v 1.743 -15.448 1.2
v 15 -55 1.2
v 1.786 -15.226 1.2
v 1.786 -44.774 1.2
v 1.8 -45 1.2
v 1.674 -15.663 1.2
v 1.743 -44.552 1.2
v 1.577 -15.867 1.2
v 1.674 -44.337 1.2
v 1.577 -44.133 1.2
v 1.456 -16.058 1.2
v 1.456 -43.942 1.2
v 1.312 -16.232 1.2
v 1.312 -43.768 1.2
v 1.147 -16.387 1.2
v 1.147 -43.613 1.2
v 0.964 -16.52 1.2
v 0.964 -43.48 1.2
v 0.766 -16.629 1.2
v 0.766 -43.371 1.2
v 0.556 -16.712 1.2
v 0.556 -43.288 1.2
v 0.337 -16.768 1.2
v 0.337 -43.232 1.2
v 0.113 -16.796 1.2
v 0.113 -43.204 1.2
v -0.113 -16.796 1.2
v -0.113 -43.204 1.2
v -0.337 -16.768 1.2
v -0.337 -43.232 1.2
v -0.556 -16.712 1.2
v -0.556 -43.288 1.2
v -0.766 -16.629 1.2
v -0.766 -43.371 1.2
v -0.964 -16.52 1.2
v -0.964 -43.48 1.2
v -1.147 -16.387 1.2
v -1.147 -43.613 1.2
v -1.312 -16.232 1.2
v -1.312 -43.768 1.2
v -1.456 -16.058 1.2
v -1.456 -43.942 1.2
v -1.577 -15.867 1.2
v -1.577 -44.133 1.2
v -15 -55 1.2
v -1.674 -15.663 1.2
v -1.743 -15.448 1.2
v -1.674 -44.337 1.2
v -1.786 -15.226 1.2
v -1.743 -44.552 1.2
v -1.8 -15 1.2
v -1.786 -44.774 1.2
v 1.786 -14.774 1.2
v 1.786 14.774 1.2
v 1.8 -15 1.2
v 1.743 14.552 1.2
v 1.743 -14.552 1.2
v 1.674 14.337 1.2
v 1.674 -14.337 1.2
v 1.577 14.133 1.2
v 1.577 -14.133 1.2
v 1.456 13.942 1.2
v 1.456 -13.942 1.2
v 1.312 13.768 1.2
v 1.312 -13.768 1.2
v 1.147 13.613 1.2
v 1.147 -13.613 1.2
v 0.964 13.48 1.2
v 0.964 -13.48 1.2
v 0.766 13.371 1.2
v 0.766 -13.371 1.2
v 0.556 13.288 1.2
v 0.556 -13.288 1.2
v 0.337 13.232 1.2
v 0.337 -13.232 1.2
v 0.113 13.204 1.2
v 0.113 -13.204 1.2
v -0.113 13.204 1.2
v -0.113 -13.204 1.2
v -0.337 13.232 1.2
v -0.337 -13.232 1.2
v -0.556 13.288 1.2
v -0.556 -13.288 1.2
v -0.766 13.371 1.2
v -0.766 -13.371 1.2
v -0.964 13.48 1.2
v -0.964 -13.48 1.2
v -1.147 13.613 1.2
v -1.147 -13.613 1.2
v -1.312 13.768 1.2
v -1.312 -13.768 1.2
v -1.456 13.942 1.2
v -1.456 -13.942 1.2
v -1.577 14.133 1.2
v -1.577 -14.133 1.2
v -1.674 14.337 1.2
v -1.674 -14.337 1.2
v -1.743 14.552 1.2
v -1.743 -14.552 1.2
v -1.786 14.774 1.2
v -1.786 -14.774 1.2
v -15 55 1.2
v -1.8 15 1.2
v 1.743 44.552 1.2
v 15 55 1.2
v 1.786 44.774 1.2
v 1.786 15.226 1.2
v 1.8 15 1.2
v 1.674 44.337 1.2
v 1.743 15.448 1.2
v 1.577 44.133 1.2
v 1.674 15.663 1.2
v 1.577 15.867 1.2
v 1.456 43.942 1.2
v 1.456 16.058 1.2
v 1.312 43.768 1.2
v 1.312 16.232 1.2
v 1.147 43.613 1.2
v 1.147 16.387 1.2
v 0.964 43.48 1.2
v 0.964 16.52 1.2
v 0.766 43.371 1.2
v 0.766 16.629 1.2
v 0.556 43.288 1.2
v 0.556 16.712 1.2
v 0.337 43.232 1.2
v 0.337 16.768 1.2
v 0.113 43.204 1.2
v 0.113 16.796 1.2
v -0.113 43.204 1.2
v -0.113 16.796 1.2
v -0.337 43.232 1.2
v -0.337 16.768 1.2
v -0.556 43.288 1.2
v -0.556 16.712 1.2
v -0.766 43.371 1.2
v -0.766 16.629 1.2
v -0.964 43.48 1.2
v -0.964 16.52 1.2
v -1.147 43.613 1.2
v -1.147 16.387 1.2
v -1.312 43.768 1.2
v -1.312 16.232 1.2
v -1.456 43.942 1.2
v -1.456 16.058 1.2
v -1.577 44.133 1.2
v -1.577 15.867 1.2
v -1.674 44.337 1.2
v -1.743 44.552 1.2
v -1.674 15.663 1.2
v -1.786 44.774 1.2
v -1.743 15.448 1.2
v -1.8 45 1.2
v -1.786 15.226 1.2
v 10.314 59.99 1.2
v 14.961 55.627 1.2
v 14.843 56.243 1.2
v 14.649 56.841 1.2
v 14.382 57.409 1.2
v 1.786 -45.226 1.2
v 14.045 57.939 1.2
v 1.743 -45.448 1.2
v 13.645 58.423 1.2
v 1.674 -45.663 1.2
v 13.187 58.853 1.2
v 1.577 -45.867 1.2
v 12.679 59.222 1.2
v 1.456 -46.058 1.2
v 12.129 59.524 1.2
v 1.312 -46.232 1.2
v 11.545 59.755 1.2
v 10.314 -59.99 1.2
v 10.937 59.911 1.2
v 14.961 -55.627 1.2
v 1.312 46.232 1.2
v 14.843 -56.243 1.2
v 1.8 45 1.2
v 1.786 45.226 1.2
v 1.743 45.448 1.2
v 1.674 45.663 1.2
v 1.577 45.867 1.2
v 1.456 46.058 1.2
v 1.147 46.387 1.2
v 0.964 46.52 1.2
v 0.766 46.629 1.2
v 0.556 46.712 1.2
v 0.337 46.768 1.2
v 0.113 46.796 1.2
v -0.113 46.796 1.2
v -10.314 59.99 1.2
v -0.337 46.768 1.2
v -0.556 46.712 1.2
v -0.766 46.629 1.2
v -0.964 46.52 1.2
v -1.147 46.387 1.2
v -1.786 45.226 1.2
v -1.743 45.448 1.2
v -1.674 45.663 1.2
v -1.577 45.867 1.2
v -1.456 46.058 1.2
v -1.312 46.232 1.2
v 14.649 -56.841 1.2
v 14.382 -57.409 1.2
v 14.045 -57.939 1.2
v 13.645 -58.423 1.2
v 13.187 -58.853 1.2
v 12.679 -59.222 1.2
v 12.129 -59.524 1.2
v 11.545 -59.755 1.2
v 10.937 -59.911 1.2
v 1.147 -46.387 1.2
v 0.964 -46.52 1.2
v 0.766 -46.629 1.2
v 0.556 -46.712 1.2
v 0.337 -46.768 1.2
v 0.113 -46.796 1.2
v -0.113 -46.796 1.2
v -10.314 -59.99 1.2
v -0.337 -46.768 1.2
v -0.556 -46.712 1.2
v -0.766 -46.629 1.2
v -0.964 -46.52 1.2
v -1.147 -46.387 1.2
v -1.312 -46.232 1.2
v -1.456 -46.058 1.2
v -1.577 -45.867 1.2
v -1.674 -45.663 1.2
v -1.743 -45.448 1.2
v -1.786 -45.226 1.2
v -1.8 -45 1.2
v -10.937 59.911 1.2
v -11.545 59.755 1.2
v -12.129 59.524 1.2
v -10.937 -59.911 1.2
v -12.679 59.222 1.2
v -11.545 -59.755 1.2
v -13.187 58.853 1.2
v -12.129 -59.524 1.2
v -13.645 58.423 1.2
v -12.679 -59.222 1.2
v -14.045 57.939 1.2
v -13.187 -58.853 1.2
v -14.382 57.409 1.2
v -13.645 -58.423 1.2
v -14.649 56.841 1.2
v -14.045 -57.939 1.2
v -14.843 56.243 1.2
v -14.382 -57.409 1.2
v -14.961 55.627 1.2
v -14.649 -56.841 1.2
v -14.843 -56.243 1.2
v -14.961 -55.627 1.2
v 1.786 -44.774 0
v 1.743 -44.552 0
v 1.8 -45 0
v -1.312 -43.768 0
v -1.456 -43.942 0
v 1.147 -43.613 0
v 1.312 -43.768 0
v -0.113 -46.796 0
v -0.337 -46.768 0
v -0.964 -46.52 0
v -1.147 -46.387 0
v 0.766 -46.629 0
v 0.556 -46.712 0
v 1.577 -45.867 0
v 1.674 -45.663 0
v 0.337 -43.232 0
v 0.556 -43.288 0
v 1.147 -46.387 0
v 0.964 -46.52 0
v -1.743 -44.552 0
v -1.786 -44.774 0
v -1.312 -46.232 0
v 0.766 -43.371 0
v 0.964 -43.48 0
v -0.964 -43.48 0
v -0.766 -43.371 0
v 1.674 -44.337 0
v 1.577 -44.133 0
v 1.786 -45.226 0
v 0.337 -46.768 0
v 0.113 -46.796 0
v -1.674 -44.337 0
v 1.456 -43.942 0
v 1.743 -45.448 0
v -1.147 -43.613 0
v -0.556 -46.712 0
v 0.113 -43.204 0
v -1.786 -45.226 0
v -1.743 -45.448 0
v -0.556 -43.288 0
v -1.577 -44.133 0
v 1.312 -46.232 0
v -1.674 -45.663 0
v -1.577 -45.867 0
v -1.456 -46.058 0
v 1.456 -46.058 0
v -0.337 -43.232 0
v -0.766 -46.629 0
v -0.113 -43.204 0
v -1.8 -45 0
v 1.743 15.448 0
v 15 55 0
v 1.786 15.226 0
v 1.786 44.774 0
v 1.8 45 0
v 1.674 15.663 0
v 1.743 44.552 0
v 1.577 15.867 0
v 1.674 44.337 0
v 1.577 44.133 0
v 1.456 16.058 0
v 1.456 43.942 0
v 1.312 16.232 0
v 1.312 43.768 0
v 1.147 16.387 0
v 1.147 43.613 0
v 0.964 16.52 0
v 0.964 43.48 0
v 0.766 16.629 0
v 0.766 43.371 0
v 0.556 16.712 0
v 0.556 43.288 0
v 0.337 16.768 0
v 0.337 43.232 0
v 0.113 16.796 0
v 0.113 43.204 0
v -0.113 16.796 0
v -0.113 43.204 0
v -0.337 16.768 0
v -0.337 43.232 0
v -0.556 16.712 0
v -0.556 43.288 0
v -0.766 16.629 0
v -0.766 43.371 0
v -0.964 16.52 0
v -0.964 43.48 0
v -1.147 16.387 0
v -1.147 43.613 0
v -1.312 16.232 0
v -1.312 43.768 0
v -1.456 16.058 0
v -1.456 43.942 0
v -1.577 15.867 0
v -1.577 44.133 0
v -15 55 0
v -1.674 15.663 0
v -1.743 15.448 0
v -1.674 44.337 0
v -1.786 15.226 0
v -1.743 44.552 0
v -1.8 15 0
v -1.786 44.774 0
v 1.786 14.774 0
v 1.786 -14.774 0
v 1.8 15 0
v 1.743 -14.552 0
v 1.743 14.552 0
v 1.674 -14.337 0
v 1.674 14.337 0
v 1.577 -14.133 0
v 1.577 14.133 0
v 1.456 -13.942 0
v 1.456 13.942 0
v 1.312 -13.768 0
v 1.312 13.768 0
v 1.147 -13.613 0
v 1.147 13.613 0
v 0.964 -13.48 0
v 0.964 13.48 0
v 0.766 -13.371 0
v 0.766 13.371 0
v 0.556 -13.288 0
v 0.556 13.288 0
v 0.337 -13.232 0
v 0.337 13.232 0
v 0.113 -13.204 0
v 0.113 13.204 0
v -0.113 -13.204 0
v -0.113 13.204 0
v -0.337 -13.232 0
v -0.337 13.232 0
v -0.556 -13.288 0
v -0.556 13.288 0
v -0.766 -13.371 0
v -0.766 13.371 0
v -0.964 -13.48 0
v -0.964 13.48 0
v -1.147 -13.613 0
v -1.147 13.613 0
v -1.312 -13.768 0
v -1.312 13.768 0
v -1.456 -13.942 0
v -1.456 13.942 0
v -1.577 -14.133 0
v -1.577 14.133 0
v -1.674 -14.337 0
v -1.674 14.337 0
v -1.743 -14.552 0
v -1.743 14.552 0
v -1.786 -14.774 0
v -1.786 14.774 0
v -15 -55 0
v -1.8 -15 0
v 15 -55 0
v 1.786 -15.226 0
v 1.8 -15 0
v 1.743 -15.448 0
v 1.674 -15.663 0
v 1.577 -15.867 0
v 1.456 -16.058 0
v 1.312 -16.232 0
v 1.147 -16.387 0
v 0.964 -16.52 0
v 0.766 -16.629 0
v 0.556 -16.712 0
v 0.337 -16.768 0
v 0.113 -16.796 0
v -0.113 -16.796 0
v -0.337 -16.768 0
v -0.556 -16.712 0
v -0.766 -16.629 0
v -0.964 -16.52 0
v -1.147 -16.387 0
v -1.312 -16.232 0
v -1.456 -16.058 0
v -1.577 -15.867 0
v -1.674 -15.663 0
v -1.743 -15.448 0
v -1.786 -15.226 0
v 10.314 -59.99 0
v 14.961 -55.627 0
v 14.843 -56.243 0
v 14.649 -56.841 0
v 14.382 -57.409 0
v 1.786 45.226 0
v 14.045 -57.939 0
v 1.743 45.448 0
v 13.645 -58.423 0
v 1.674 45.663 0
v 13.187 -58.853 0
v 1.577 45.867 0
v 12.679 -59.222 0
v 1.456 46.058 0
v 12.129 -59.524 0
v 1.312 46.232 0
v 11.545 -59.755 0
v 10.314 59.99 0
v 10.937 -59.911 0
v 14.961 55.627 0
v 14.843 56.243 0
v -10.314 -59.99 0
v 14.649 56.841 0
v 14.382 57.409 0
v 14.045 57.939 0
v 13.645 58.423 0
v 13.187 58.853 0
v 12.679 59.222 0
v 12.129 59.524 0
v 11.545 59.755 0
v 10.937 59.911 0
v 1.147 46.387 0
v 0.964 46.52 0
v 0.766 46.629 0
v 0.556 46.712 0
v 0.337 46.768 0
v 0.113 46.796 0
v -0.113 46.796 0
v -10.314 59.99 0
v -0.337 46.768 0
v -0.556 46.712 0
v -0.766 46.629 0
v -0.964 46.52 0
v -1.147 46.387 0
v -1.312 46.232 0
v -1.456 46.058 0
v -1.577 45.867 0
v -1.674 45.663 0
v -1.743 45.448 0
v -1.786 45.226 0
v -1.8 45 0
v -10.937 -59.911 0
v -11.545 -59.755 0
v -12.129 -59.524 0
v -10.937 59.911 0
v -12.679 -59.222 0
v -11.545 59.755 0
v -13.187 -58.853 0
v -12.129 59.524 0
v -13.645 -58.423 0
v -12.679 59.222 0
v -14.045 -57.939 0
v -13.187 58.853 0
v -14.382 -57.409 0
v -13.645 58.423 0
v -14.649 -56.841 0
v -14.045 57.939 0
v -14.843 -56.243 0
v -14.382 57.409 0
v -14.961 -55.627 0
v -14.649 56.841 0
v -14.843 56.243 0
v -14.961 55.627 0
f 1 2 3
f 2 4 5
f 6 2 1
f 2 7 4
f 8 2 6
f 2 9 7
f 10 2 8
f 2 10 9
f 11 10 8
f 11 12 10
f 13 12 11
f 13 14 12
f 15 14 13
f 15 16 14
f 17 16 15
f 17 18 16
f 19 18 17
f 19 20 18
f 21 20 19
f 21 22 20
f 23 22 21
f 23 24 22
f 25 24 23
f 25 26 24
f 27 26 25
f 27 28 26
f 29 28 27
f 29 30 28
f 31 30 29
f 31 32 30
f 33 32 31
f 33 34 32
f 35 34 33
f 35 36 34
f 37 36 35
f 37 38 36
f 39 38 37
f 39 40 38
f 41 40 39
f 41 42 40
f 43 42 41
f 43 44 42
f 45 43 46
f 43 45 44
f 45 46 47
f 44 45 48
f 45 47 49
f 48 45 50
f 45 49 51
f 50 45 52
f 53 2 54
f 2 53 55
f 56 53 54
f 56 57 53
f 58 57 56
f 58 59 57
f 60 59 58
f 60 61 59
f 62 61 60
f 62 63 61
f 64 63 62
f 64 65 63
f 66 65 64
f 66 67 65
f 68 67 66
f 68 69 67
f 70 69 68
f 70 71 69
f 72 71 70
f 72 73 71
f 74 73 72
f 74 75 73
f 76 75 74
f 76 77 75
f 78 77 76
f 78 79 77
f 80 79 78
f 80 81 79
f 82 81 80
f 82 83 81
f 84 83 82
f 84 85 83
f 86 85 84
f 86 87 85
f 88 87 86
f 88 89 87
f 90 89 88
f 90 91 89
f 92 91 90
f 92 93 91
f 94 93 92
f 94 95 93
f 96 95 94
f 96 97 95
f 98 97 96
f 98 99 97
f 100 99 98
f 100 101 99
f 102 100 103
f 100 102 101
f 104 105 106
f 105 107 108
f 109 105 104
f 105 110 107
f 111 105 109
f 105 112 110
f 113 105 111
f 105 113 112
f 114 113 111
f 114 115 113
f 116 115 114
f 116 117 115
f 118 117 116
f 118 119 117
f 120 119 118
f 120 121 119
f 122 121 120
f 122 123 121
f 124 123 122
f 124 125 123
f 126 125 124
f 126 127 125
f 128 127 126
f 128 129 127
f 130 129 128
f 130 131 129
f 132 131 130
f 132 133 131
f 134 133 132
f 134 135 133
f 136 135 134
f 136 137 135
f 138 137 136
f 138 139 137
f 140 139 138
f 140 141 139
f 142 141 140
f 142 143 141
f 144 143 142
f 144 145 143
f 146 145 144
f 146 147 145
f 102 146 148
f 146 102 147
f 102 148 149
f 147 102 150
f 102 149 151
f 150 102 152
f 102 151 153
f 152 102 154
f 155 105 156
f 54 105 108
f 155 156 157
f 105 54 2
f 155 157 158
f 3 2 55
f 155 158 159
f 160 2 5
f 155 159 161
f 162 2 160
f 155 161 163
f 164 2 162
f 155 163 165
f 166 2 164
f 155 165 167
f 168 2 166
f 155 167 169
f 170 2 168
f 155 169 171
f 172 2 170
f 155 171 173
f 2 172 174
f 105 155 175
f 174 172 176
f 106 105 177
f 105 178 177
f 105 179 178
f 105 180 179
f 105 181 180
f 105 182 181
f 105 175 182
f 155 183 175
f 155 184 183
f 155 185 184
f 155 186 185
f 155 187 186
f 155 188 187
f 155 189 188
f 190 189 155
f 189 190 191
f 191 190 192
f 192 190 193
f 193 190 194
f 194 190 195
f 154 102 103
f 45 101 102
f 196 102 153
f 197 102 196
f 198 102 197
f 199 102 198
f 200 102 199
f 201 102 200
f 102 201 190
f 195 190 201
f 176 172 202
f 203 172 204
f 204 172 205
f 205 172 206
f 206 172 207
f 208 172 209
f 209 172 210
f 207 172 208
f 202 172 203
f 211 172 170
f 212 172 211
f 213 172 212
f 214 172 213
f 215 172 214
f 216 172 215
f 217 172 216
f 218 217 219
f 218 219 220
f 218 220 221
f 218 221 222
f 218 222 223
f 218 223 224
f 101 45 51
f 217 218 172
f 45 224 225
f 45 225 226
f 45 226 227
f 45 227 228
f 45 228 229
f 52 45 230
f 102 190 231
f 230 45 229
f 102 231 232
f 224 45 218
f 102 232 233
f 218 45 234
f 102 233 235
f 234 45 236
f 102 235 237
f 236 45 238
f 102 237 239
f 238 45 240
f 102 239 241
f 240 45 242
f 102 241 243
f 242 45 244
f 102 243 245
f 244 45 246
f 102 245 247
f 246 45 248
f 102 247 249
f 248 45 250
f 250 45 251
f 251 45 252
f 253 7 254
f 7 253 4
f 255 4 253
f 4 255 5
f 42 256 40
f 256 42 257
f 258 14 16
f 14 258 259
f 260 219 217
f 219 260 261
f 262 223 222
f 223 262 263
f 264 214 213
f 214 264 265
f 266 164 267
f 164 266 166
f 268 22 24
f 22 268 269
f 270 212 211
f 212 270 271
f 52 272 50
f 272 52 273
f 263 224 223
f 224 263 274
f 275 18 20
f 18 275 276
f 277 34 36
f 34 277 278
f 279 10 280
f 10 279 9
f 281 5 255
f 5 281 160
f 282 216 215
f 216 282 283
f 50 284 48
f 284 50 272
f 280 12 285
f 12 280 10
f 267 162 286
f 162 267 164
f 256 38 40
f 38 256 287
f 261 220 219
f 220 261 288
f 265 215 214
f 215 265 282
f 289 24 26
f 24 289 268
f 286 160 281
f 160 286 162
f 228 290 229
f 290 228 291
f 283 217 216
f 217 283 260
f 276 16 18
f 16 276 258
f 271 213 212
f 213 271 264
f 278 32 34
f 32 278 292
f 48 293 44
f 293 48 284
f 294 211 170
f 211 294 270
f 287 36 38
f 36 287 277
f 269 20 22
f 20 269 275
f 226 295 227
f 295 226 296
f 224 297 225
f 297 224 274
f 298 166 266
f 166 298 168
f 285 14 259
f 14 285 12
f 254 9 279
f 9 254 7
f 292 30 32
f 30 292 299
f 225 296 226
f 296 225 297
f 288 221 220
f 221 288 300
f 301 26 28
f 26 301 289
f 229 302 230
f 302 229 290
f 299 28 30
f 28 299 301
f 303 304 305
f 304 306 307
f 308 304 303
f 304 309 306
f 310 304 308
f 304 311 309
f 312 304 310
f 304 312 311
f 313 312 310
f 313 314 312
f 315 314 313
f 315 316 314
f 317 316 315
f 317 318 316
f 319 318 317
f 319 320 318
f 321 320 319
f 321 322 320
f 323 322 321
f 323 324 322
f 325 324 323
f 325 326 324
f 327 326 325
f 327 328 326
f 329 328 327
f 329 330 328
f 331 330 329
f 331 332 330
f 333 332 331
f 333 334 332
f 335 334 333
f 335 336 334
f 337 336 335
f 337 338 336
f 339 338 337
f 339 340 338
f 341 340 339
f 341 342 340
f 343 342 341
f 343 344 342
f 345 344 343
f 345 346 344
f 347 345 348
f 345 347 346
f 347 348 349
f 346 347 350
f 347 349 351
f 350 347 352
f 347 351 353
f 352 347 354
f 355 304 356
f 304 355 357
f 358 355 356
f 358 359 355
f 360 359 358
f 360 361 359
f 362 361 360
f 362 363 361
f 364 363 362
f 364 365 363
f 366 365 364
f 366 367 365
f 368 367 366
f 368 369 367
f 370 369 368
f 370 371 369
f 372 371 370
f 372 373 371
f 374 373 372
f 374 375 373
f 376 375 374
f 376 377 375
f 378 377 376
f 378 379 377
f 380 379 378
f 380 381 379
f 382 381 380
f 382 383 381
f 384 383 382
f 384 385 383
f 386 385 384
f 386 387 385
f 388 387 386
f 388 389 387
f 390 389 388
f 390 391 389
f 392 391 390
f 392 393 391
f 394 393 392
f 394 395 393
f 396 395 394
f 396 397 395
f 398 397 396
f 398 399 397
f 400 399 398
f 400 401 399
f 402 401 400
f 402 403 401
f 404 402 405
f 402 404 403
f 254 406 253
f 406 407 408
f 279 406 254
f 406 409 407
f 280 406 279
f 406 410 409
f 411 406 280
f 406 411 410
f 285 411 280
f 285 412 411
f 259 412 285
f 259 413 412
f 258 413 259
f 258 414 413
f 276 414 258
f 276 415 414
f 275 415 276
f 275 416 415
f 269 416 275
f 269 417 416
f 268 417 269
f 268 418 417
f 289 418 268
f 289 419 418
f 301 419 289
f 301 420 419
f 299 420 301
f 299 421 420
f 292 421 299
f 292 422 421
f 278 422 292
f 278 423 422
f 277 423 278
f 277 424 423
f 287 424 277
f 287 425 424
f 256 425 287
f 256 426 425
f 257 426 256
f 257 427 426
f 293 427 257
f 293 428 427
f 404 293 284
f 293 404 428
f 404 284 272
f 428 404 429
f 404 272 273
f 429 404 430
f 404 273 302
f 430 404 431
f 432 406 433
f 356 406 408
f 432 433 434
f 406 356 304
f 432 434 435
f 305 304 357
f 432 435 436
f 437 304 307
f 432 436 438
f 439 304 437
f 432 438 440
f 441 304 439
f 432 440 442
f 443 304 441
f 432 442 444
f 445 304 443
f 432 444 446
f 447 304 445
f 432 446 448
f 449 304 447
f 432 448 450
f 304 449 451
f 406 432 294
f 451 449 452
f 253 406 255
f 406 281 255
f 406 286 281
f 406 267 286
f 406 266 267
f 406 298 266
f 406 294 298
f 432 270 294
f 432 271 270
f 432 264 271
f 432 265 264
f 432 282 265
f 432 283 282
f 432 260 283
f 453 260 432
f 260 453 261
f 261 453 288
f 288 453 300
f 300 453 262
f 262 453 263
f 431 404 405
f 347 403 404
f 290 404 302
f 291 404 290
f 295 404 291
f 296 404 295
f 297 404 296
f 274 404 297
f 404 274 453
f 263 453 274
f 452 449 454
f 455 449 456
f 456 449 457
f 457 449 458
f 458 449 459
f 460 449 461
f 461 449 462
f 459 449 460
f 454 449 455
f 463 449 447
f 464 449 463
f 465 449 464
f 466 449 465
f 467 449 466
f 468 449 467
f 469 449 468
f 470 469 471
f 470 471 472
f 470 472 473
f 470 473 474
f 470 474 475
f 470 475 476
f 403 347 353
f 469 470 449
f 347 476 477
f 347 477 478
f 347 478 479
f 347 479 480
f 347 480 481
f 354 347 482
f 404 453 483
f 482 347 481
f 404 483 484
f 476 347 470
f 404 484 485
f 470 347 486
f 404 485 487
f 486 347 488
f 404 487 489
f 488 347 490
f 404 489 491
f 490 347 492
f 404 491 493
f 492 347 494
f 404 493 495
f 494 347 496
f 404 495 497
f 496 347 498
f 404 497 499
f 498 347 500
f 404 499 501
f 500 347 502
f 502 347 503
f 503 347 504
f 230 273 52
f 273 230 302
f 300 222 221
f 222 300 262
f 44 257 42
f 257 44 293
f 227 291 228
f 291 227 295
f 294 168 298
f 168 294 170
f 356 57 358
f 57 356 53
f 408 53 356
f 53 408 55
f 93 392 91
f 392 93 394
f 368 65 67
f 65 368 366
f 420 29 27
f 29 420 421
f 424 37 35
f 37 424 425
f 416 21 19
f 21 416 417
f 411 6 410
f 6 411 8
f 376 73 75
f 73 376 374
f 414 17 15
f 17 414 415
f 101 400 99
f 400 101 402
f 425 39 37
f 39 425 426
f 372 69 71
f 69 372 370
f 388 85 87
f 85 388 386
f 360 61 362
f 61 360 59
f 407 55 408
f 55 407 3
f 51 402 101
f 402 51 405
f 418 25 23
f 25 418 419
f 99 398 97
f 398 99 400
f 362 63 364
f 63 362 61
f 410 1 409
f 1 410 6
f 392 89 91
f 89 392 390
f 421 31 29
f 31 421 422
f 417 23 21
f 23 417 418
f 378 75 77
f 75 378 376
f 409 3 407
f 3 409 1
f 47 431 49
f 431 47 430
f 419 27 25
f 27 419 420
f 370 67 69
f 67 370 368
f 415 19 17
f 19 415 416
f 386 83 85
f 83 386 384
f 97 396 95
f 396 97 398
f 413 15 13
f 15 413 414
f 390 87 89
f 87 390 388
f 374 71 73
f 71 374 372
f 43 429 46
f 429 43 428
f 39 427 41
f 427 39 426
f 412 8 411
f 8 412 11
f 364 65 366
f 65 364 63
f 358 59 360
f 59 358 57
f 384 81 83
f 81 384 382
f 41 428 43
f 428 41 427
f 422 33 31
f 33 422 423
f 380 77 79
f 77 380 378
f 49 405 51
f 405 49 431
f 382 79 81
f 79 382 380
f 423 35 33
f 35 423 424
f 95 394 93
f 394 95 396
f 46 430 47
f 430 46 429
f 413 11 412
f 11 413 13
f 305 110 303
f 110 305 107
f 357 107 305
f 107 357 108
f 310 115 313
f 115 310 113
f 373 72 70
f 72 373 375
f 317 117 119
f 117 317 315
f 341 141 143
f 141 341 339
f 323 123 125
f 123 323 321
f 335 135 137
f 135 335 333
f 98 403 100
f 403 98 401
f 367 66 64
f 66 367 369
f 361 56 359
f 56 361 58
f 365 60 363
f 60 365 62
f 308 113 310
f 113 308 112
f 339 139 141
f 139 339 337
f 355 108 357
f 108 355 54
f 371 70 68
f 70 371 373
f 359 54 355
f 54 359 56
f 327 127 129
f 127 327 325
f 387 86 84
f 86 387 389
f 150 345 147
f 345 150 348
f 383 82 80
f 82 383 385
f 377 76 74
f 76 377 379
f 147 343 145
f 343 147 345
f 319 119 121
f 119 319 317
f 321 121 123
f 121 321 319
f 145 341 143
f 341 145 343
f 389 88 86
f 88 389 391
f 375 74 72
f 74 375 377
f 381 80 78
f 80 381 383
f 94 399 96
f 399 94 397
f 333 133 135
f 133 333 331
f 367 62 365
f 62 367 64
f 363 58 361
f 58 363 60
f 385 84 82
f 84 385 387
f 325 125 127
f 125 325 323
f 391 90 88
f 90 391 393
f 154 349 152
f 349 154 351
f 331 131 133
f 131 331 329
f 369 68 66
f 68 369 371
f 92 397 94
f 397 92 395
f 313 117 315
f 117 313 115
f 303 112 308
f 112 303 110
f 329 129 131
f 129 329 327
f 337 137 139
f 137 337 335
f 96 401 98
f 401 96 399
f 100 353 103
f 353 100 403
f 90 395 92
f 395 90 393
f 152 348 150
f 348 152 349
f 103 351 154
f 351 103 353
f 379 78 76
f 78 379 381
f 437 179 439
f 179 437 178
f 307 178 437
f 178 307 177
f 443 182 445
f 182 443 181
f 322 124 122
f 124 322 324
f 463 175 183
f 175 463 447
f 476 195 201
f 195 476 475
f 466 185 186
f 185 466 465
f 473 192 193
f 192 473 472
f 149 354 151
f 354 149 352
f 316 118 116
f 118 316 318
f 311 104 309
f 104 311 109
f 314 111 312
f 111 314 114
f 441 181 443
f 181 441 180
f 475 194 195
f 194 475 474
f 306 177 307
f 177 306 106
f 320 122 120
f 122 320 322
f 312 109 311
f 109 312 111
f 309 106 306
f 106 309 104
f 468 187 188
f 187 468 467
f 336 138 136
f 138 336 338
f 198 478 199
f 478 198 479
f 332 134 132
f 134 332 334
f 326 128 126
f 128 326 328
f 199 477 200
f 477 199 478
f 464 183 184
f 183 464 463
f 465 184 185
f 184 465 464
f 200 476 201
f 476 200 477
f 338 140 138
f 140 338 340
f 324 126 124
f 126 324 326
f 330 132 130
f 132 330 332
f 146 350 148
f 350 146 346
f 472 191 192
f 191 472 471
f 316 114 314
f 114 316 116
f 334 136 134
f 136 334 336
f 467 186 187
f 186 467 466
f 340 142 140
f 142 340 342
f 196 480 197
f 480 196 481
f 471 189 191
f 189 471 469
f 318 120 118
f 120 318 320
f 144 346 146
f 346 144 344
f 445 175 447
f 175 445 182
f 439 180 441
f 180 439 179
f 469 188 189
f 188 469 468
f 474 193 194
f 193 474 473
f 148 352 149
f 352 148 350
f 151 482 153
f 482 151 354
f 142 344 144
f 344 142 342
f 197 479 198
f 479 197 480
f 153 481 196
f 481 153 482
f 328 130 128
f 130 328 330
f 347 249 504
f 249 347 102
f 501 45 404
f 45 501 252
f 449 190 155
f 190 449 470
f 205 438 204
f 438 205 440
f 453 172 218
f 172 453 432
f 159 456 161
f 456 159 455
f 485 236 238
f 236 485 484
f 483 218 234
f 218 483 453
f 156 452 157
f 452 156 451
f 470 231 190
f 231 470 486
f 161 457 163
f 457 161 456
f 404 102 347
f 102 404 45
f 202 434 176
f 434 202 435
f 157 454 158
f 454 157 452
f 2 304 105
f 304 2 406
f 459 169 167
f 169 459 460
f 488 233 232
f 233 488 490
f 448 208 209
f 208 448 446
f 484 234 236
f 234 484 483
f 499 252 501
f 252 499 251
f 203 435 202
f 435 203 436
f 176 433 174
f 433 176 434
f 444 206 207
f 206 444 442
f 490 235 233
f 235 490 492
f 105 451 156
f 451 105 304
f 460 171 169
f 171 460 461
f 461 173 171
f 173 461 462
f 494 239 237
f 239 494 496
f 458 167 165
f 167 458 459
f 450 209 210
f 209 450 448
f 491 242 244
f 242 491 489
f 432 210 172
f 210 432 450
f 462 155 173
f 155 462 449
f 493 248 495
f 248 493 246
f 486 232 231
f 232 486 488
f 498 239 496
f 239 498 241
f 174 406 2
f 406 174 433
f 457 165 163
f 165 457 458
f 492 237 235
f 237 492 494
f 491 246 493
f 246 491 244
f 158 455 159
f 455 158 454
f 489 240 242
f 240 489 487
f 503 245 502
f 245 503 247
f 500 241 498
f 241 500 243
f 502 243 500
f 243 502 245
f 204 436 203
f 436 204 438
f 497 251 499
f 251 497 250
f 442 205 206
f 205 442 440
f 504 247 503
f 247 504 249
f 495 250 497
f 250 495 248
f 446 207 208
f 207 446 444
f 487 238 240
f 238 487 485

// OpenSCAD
$fn = 50;


difference() {
	union() {
		hull() {
			translate(v = [-10.0000000000, 55.0000000000, 0]) {
				cylinder(h = 21, r = 5);
			}
			translate(v = [10.0000000000, 55.0000000000, 0]) {
				cylinder(h = 21, r = 5);
			}
			translate(v = [-10.0000000000, -55.0000000000, 0]) {
				cylinder(h = 21, r = 5);
			}
			translate(v = [10.0000000000, -55.0000000000, 0]) {
				cylinder(h = 21, r = 5);
			}
		}
	}
	union() {
		translate(v = [0, 0, 1.2000000000]) {
			hull() {
				translate(v = [-10.0000000000, 55.0000000000, 0]) {
					cylinder(h = 19.8000000000, r = 3.8000000000);
				}
				translate(v = [10.0000000000, 55.0000000000, 0]) {
					cylinder(h = 19.8000000000, r = 3.8000000000);
				}
				translate(v = [-10.0000000000, -55.0000000000, 0]) {
					cylinder(h = 19.8000000000, r = 3.8000000000);
				}
				translate(v = [10.0000000000, -55.0000000000, 0]) {
					cylinder(h = 19.8000000000, r = 3.8000000000);
				}
			}
		}
		#translate(v = [0.0000000000, -45.0000000000, 0]) {
			cylinder(h = 1.2000000000, r = 1.8000000000);
		}
		#translate(v = [0.0000000000, -15.0000000000, 0]) {
			cylinder(h = 1.2000000000, r = 1.8000000000);
		}
		#translate(v = [0.0000000000, 15.0000000000, 0]) {
			cylinder(h = 1.2000000000, r = 1.8000000000);
		}
		#translate(v = [0.0000000000, 45.0000000000, 0]) {
			cylinder(h = 1.2000000000, r = 1.8000000000);
		}
		translate(v = [-250.0000000000, -250.0000000000, 1.2000000000]) {
			cube(size = [500, 500, 500]);
		}
		translate(v = [-250.0000000000, -250.0000000000, 1.2000000000]) {
			cube(size = [500, 500, 500]);
		}
		translate(v = [-250.0000000000, -250.0000000000, 1.2000000000]) {
			cube(size = [500, 500, 500]);
		}
	}
}
